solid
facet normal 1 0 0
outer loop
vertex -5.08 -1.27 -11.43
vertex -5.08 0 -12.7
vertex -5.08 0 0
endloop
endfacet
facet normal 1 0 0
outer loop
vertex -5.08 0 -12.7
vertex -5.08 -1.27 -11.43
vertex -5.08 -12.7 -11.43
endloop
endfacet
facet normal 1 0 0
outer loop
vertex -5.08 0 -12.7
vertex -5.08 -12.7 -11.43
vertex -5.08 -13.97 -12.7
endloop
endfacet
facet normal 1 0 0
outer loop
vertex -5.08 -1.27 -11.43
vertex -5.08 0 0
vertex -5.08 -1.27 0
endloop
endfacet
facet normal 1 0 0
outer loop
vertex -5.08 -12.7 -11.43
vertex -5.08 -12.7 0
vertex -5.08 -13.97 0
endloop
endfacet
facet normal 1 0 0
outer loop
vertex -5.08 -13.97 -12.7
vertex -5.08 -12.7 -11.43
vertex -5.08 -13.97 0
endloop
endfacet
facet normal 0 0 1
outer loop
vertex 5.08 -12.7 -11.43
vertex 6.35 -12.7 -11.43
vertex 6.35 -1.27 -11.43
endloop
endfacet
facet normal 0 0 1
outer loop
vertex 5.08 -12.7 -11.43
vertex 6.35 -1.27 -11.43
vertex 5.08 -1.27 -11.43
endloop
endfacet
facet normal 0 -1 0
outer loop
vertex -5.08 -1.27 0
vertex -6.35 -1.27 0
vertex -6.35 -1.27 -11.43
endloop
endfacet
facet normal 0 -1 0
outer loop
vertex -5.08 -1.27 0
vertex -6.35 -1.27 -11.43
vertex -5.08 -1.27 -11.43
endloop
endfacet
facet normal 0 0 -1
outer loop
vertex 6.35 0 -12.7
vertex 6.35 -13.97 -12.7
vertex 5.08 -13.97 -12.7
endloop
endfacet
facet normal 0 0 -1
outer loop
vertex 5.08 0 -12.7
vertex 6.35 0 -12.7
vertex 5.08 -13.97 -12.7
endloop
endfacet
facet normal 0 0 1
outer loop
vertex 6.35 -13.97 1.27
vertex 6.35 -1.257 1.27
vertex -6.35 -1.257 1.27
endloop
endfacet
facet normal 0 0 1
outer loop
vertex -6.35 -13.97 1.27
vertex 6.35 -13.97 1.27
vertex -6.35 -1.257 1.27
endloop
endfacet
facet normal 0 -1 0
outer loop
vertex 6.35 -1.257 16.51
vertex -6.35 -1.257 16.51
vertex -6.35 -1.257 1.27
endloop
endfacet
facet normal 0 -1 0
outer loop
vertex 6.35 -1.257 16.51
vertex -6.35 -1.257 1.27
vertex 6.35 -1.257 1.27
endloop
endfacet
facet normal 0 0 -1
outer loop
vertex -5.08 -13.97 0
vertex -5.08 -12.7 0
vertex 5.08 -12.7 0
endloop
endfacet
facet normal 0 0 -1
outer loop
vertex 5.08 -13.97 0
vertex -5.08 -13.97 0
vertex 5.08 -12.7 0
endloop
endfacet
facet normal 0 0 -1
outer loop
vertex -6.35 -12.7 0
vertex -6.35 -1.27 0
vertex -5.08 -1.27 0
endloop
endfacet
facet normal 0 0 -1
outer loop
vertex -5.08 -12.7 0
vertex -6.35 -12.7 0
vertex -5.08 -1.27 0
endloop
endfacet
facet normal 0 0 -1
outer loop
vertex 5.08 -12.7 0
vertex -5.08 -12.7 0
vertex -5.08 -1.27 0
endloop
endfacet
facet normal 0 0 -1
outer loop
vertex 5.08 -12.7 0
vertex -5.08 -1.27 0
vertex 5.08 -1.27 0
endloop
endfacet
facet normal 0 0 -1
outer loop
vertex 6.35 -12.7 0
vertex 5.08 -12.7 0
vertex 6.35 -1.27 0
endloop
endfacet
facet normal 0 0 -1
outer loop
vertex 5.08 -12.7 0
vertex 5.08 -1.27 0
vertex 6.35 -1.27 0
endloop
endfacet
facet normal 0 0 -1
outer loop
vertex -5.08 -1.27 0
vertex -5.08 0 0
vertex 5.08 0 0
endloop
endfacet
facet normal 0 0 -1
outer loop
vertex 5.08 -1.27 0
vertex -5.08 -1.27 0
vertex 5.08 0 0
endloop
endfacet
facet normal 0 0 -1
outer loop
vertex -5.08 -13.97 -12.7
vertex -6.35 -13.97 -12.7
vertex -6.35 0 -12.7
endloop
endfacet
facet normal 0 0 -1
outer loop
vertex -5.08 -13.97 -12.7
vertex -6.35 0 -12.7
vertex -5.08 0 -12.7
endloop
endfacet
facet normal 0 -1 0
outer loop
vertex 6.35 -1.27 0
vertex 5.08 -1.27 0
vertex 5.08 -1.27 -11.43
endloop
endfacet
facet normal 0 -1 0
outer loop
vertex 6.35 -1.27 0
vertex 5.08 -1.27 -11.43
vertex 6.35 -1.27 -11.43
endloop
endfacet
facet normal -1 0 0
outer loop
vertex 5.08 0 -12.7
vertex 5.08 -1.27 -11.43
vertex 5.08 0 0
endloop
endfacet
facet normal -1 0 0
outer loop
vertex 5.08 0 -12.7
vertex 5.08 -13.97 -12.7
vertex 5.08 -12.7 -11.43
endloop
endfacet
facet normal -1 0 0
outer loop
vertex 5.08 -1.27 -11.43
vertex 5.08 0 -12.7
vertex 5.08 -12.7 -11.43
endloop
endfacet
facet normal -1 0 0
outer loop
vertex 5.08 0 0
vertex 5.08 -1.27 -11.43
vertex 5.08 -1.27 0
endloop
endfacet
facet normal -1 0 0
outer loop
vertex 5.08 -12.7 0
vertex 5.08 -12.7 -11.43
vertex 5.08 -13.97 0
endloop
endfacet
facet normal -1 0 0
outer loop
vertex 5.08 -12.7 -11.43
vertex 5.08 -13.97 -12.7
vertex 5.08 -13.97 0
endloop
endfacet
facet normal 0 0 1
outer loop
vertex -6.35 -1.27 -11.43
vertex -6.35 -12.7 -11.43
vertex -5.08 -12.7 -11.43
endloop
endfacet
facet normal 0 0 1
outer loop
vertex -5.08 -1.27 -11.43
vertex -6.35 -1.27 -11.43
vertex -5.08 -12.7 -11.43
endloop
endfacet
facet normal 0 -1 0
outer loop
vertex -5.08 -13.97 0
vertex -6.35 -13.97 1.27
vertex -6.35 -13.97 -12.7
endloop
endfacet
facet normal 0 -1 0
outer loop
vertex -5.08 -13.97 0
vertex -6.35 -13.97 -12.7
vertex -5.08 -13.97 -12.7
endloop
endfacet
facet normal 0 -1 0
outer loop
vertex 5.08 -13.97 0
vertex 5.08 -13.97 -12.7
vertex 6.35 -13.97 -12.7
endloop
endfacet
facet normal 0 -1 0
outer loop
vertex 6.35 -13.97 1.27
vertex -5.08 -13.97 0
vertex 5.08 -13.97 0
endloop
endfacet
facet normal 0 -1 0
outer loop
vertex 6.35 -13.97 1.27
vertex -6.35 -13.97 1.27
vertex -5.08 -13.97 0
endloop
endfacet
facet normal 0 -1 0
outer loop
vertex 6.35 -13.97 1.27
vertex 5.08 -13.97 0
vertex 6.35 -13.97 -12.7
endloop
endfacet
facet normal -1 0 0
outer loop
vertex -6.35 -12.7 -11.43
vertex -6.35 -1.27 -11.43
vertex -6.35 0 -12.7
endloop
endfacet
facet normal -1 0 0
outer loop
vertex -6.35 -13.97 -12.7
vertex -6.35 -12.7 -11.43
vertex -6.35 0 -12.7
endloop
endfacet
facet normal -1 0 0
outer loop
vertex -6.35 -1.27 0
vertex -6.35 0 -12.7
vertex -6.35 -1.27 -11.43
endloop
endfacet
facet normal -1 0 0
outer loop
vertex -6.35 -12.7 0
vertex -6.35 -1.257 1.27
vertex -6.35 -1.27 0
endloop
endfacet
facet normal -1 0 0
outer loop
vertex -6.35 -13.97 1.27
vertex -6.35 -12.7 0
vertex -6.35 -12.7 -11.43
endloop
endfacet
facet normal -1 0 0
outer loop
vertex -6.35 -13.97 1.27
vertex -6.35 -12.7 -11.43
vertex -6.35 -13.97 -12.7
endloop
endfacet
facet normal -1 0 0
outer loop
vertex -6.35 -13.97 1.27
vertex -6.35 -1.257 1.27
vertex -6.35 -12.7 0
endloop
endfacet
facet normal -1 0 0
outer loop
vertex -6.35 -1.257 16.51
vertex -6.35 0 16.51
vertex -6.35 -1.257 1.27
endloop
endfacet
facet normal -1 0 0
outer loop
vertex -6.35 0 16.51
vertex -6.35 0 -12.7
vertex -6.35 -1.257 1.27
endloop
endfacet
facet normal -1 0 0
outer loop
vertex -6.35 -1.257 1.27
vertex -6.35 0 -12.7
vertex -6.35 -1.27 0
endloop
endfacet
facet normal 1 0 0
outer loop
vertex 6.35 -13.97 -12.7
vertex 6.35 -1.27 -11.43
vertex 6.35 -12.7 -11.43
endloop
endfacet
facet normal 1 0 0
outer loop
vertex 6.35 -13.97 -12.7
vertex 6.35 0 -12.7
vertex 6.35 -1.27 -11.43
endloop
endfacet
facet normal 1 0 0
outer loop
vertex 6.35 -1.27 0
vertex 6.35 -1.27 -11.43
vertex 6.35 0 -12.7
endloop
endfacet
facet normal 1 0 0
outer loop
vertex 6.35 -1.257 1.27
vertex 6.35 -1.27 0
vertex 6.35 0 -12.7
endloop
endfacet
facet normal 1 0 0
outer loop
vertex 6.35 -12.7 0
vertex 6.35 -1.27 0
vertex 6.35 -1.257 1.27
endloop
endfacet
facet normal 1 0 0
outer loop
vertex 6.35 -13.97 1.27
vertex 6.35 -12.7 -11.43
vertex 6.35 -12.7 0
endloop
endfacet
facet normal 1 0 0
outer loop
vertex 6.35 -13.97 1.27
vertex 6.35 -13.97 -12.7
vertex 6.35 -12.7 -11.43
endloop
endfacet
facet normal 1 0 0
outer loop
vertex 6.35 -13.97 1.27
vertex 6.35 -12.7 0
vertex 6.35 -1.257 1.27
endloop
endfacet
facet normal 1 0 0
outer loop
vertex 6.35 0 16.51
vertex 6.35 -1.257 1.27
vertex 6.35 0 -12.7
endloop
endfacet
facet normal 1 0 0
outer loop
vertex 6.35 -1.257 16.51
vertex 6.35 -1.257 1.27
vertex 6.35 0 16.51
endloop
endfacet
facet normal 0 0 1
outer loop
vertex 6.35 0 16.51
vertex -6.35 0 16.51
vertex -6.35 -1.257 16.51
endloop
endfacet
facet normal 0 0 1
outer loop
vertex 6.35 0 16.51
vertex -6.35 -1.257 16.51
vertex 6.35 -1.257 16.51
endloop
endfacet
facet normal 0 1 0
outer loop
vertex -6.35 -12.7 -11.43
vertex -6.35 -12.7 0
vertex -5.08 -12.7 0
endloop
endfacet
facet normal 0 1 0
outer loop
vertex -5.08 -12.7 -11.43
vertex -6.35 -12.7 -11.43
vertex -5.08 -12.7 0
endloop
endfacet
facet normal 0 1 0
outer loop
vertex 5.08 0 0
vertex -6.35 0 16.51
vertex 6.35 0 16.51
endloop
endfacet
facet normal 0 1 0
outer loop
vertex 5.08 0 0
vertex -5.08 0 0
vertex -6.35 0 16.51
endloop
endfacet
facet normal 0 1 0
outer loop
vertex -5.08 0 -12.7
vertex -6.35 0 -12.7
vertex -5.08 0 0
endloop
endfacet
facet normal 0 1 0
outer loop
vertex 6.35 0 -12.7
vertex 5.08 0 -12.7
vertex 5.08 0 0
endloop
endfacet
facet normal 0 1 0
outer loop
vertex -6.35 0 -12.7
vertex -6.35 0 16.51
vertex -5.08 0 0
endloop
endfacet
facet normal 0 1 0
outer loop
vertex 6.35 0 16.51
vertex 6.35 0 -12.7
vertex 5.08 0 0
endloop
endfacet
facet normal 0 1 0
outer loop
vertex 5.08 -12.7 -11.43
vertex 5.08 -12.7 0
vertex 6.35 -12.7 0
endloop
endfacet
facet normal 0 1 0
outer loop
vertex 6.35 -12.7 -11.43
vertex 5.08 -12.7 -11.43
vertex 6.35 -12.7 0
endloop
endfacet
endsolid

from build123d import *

# Parameters (mm, degrees)
F1_DEPTH = 13.97
F2_W     = 12.7
F2_H     = 1.257444
F3_DEPTH = 15.24
F4_W     = 1.27
F4_H     = 1.27
F5_DEPTH = 12.7
F6_W     = 1.27
F6_H     = 1.27
F7_DEPTH = 12.7


with BuildPart() as f1:
    # F0 (on Front) → F1 (new body)
    with BuildSketch(Plane.XZ):
        Polygon((-6.35, 0), (0, 0), (6.35, 0), (6.35, 1.27), (0, 1.27), (-6.35, 1.27), align=None)
    extrude(amount=F1_DEPTH)

    # F2 (on face) → F3 (join)
    with BuildSketch(Plane.XY.offset(1.27)):
        with Locations((0, -0.628722)):
            Rectangle(F2_W, F2_H)
    extrude(amount=F3_DEPTH)

    # F4 (on face) → F5 (join)
    with BuildSketch(Plane(origin=(0, 0, 0), x_dir=(1, 0, 0), z_dir=(0, 0, -1))):
        with Locations((-5.715, 13.335)):
            Rectangle(F4_W, F4_H)
        with Locations((-5.715, 0.635)):
            Rectangle(F4_W, F4_H)
        with Locations((5.715, 0.635)):
            Rectangle(F4_W, F4_H)
        with Locations((5.715, 13.335)):
            Rectangle(F4_W, F4_H)
    extrude(amount=F5_DEPTH)

    # F6 (on face) → F7 (join)
    with BuildSketch(Plane(origin=(0, -12.7, 0), x_dir=(-1, 0, 0), z_dir=(0, 1, 0))):
        with Locations((-5.715, -12.065)):
            Rectangle(F6_W, F6_H)
    extrude(amount=F7_DEPTH)

    # F8: F1 across plane


with BuildPart() as f1_1:
    add(f1.part)
    add(f1.part.mirror(Plane.YZ))


solid = f1_1.part
